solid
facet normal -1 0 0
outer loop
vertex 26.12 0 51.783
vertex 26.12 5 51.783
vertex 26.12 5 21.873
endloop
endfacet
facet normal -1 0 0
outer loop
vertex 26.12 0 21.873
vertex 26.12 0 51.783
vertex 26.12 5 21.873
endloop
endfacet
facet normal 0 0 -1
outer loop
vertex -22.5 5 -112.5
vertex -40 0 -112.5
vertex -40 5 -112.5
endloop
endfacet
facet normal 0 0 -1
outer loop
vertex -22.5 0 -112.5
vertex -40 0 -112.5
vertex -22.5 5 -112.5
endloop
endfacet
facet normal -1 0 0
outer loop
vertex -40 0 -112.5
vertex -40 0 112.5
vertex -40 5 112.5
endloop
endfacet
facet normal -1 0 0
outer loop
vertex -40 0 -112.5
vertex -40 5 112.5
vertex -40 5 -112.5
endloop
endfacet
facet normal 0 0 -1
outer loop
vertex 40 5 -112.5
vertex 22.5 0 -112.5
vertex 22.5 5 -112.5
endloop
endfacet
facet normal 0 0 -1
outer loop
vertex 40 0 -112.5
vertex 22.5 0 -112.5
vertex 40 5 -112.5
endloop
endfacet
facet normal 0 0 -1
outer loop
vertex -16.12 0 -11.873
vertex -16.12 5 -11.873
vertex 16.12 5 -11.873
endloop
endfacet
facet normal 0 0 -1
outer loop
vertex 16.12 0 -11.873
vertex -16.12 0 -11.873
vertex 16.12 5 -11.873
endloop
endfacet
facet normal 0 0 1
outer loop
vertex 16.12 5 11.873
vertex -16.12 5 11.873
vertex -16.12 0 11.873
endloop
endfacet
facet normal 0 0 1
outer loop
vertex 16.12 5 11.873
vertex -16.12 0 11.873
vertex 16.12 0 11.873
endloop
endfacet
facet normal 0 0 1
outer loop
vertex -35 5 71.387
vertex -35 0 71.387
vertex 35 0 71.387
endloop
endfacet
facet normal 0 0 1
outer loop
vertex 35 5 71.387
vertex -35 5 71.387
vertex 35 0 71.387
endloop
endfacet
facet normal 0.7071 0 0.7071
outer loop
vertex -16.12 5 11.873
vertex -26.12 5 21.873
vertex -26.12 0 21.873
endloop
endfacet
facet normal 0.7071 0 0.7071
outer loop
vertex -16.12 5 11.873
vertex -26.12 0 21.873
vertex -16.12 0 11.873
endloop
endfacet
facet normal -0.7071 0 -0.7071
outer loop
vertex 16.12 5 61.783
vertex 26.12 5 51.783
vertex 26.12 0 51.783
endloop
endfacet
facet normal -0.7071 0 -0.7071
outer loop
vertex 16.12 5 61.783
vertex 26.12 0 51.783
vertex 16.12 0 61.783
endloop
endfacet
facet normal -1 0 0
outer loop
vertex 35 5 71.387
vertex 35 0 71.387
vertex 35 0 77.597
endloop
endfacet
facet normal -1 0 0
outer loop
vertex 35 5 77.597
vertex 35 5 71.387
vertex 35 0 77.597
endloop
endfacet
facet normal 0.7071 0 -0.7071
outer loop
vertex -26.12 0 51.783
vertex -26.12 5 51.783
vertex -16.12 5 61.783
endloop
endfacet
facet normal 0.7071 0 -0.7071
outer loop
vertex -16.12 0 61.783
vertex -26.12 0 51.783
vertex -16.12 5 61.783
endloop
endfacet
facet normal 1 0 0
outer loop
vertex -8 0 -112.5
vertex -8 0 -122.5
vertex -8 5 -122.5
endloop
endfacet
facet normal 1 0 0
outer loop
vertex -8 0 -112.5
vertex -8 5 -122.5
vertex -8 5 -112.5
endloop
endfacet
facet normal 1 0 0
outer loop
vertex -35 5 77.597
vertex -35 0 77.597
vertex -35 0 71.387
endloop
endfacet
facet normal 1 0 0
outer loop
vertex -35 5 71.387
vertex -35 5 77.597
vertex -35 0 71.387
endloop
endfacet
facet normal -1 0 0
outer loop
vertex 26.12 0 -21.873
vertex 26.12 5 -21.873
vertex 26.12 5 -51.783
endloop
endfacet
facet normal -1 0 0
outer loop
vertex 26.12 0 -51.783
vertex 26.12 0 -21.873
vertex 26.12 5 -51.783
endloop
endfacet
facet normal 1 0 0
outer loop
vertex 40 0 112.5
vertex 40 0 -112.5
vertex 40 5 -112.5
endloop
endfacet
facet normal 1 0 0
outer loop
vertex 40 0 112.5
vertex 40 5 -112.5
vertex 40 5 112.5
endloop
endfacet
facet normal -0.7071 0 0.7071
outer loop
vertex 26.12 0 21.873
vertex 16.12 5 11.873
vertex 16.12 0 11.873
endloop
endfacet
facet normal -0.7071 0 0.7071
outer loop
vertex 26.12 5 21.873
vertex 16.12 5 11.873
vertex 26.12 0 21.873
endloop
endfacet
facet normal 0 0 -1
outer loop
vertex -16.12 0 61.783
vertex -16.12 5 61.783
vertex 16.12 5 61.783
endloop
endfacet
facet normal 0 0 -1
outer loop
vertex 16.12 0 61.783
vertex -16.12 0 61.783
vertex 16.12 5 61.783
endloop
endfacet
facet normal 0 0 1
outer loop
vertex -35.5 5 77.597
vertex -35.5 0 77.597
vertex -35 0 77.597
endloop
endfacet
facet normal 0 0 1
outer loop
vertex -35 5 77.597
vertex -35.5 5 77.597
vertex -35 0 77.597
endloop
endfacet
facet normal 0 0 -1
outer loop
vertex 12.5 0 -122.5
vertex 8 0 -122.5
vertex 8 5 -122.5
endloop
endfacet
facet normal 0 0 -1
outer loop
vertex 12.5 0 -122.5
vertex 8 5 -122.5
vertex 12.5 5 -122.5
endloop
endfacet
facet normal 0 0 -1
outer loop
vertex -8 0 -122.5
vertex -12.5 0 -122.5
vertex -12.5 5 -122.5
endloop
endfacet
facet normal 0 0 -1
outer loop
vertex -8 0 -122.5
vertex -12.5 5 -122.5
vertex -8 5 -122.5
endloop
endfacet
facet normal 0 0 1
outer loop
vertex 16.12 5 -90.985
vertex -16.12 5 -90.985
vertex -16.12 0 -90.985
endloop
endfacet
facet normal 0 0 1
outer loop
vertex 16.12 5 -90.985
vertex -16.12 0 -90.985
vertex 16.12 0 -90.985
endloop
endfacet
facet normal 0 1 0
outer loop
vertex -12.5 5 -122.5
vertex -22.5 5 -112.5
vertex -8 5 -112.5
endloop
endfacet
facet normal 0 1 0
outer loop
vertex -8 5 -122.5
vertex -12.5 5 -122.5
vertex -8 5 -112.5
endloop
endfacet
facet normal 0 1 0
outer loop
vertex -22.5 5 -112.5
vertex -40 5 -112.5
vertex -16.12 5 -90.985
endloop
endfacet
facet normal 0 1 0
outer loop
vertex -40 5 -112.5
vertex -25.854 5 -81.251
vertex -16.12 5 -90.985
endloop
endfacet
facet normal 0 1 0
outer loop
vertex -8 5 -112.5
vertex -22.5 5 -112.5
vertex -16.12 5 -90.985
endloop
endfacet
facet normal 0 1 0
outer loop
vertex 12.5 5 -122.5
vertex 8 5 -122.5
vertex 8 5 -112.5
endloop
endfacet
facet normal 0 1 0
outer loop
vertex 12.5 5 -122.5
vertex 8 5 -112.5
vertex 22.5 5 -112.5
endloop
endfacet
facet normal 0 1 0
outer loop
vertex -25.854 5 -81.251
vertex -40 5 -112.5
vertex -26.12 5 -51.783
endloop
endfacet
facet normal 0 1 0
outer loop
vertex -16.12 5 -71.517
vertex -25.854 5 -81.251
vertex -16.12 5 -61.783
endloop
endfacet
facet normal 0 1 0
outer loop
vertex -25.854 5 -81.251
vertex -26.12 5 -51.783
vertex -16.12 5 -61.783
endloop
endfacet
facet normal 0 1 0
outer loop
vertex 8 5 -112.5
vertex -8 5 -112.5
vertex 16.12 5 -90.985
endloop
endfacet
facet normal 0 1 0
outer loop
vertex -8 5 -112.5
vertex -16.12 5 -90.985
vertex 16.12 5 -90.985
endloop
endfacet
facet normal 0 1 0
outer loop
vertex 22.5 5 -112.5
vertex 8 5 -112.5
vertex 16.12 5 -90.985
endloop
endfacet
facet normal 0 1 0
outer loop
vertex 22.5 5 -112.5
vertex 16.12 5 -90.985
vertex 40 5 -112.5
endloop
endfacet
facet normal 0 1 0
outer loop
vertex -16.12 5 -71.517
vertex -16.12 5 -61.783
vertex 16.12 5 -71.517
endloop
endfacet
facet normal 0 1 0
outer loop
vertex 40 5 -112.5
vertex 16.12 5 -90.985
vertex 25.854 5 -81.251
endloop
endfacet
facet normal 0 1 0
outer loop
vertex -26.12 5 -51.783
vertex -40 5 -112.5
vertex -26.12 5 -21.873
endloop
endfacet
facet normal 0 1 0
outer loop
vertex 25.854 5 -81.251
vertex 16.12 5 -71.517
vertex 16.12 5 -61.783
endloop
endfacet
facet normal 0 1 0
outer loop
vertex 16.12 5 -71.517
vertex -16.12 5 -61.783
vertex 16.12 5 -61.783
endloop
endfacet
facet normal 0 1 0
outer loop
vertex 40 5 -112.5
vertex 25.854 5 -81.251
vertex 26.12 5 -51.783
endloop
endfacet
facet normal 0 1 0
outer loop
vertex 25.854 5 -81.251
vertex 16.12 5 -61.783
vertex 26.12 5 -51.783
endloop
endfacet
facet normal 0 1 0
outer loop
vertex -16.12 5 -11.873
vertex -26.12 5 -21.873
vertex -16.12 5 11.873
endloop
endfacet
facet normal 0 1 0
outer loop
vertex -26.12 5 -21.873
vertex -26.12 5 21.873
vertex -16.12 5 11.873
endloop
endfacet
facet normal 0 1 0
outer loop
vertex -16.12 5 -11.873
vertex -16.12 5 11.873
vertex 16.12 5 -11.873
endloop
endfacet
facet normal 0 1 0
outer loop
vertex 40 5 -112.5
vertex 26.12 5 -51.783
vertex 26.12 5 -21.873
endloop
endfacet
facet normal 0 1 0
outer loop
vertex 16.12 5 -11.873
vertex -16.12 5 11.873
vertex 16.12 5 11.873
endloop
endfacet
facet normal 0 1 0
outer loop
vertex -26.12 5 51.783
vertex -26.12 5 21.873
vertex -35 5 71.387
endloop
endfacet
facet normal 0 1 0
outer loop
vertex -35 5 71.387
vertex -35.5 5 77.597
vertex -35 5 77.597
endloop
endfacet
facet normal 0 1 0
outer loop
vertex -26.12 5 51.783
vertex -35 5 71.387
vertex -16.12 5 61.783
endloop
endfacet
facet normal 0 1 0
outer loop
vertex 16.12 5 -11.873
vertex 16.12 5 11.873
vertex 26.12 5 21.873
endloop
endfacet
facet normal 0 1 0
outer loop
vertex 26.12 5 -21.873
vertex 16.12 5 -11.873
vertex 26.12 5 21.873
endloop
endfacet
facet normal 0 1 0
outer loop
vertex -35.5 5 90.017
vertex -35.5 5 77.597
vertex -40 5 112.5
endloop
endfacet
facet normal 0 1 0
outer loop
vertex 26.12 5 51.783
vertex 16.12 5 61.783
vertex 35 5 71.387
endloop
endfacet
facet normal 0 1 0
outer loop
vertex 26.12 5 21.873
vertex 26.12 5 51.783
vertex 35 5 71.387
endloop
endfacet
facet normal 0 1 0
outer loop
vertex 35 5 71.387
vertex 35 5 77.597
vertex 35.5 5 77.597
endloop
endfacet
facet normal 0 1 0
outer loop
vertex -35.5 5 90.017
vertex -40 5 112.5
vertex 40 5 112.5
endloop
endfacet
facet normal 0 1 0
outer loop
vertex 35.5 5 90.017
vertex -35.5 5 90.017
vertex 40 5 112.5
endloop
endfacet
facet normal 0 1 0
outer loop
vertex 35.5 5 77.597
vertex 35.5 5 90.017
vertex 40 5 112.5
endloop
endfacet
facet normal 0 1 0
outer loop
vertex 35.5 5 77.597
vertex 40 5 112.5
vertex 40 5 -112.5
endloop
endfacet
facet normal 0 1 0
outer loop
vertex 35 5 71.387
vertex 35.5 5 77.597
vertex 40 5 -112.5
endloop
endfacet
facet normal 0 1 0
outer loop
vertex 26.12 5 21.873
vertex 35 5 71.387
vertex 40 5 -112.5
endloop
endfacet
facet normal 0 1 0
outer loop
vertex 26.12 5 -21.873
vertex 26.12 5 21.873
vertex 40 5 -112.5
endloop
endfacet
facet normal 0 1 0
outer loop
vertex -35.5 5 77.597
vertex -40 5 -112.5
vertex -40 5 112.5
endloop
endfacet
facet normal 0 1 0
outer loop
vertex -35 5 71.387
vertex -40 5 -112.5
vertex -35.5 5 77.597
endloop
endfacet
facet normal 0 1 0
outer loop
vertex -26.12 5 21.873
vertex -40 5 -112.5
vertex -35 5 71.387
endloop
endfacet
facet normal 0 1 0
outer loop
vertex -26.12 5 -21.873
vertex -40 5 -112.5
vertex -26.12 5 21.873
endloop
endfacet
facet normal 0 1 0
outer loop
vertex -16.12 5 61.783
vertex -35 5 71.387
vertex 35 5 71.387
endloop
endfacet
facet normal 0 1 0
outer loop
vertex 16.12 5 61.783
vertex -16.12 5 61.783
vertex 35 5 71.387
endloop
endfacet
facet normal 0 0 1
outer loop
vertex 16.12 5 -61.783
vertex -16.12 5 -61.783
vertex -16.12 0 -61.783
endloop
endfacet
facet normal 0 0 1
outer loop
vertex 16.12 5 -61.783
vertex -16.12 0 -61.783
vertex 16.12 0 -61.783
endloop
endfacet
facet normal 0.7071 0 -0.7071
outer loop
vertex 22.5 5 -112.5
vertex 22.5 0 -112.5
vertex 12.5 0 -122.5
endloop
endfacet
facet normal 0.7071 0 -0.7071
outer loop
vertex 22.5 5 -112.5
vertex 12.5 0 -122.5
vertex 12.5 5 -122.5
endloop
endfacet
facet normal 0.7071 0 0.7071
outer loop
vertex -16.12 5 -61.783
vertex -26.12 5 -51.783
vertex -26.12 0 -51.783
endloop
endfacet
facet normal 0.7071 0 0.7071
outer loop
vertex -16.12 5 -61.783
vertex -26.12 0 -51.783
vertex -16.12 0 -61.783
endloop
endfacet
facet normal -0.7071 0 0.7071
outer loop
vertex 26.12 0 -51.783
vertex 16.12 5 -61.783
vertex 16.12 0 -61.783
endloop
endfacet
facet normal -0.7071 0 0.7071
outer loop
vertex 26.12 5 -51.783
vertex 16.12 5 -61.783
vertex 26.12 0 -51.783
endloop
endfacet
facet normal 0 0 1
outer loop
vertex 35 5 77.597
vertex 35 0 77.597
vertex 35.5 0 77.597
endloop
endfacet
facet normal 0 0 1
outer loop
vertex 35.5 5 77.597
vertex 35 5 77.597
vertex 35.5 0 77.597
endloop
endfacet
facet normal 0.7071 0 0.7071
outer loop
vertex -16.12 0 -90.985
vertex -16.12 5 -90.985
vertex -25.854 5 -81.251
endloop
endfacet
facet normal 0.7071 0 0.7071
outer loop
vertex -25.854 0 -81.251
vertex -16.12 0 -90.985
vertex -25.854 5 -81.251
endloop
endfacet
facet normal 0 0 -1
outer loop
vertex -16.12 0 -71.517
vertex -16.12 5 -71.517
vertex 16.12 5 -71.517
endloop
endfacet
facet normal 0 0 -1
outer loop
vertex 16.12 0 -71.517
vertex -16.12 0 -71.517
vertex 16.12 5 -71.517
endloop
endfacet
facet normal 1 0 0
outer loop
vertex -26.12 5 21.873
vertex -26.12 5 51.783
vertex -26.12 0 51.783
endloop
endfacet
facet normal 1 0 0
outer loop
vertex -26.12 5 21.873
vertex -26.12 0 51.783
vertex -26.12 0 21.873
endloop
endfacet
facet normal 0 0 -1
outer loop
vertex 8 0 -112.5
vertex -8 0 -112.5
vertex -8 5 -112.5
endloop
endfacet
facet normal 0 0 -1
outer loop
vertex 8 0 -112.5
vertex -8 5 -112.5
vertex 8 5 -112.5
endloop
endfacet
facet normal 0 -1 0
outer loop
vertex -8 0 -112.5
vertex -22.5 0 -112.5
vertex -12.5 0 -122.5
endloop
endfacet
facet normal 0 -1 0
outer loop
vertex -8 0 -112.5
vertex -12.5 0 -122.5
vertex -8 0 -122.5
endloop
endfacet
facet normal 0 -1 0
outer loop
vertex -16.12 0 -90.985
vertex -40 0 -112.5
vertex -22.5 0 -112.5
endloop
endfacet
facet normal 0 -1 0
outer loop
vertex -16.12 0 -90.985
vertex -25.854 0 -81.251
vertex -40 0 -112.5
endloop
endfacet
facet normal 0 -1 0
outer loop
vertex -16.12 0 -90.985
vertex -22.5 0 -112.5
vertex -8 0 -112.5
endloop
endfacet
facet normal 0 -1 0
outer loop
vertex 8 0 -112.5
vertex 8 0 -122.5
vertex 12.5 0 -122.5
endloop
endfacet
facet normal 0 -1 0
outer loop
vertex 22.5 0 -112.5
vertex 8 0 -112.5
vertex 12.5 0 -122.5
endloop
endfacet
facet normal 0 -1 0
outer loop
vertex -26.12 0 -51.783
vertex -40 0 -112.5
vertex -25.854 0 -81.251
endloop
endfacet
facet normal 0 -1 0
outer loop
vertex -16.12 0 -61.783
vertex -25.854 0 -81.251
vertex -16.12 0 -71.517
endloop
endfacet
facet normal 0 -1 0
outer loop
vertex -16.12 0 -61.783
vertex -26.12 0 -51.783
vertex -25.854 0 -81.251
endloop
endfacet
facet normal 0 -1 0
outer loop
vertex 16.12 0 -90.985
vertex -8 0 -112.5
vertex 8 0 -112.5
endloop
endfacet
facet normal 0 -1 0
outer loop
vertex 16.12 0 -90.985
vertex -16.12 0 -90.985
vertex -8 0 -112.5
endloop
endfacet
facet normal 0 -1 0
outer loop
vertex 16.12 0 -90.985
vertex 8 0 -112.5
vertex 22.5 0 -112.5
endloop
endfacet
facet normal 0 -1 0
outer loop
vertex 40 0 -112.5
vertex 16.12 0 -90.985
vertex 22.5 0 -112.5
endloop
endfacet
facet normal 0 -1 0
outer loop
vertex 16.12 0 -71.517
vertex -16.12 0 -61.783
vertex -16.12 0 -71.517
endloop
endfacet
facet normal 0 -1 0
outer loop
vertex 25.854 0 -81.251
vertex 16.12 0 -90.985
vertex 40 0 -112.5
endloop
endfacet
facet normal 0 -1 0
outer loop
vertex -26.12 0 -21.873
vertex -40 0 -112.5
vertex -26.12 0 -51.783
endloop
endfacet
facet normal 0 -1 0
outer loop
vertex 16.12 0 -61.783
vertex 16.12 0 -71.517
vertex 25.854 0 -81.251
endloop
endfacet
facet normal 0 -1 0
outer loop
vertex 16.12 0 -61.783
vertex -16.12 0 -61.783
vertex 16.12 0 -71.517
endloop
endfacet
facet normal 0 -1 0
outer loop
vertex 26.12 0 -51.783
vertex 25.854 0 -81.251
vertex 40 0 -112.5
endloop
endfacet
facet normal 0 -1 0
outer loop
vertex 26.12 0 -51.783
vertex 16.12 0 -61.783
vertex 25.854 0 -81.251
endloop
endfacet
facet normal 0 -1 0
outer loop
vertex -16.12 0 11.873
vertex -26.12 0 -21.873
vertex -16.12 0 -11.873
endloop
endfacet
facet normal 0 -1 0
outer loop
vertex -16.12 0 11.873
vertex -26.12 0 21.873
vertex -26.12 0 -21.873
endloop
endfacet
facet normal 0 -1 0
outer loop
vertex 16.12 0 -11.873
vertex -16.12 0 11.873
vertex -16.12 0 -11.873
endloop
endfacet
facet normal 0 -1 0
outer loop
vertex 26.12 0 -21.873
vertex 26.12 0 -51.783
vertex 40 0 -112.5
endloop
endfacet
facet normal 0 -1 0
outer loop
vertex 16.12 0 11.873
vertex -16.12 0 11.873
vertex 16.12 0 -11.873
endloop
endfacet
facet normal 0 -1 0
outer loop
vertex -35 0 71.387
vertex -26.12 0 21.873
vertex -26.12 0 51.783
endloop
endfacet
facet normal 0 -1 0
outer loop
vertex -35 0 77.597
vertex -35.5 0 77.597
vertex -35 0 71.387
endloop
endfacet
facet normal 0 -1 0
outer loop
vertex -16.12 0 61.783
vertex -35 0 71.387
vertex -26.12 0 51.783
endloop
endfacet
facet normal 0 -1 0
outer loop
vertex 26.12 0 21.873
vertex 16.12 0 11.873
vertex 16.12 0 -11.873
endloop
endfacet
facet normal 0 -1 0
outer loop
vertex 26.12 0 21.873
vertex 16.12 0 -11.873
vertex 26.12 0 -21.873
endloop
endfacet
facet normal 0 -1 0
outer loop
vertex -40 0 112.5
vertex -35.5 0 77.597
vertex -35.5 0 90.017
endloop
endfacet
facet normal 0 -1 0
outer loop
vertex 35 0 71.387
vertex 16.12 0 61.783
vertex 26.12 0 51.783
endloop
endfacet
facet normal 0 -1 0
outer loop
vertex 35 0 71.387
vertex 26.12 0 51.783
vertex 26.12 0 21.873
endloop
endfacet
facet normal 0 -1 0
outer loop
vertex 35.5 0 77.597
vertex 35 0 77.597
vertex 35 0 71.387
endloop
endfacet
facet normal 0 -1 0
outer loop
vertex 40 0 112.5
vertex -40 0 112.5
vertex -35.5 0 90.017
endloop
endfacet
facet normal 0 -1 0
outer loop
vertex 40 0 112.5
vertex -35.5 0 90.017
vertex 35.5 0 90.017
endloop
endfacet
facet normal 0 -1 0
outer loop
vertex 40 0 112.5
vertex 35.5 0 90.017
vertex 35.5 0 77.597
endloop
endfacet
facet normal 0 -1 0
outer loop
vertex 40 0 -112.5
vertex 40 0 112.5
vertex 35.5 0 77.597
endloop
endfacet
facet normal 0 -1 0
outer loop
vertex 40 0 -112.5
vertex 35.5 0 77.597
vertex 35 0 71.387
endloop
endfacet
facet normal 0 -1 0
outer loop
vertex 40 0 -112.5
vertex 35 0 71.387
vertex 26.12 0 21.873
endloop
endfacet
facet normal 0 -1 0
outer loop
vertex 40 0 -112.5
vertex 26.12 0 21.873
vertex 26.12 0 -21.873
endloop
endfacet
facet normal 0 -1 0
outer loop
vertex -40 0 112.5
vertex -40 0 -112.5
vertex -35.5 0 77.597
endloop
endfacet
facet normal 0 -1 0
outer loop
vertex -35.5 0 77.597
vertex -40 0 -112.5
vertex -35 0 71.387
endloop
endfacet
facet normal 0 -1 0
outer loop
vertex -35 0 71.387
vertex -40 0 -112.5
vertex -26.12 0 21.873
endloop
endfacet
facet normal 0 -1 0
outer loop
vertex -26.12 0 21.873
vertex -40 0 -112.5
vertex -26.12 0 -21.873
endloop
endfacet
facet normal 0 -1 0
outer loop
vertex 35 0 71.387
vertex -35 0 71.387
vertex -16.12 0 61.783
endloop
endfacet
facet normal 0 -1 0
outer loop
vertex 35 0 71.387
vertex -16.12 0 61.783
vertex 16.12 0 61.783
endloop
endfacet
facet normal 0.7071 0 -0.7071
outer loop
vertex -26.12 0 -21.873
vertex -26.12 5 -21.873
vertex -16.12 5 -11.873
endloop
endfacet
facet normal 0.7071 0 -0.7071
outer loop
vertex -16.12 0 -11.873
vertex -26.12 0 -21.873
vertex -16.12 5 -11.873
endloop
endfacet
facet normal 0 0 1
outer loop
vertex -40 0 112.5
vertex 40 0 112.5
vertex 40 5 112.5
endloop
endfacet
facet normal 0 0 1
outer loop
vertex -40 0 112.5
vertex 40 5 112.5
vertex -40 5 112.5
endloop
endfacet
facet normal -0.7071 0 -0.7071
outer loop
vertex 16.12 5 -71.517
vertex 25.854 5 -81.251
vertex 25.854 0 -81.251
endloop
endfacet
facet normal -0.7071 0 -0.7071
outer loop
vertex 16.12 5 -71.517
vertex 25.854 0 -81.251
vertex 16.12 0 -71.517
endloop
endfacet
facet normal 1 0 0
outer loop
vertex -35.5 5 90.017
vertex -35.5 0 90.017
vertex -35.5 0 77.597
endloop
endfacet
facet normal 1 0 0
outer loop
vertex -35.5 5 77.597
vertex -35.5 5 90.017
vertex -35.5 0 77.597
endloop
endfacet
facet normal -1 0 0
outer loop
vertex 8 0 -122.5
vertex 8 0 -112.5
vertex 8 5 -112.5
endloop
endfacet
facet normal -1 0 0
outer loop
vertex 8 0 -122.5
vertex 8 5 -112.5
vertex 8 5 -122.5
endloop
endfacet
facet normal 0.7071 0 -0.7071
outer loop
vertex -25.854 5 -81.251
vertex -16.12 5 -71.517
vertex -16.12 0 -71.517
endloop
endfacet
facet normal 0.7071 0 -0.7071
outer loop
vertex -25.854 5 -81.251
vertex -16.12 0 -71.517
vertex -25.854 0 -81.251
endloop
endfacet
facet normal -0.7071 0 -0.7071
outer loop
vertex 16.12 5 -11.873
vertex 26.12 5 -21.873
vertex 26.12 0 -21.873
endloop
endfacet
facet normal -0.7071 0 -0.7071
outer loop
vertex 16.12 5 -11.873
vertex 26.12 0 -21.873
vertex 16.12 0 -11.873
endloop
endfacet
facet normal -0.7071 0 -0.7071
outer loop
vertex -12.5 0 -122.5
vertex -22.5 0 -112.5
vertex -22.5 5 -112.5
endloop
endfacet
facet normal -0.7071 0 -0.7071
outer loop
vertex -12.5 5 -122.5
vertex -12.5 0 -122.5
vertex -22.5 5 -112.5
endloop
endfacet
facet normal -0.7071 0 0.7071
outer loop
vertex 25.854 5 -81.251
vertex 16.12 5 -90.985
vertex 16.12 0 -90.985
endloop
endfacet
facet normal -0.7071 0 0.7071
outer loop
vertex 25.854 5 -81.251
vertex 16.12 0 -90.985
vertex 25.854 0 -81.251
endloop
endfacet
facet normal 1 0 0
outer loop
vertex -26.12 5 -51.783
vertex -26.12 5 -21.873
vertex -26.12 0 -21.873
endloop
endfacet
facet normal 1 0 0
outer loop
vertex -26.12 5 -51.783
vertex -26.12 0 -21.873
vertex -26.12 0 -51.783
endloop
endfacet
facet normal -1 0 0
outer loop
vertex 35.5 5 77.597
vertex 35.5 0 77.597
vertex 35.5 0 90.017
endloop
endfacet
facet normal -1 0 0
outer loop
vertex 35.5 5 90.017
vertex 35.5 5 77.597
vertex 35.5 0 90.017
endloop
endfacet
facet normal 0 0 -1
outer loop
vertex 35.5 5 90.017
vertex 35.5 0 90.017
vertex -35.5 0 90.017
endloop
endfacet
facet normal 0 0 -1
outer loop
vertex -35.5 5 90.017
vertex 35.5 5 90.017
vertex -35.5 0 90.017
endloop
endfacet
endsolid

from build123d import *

# Parameters (mm, degrees)
BOSS_EXTRUDE1_DEPTH = 5
CHAMFER1_SIZE       = 10
SKETCH2_W           = 52.240142394
SKETCH2_H           = 49.910170897
SKETCH2_H_2         = 19.468376047
CUT_EXTRUDE1_DEPTH  = 5
CHAMFER2_SIZE       = 10


# Some blends are built 0.0001 mm under size
with BuildPart() as part:
    # Sketch1 → Boss-Extrude1 (new body)
    with BuildSketch(Plane(origin=(0, 0, 0), x_dir=(1, 0, 0), z_dir=(0, 1, 0))):
        Polygon((12.5, 112.5), (40, 112.5), (40, -112.5), (-40, -112.5), (-40, 112.5), (-12.5, 112.5), (-12.5, 122.5), (-8, 122.5), (-8, 112.5), (8, 112.5), (8, 122.5), (12.5, 122.5), align=None)
        Polygon((35, -71.386750493), (35, -77.596695784), (35.5, -77.596695784), (35.5, -90.016586366), (-35.5, -90.016586366), (-35.5, -77.596695784), (-35, -77.596695784), (-35, -71.386750493), align=None, mode=Mode.SUBTRACT)
    extrude(amount=BOSS_EXTRUDE1_DEPTH)

    # Chamfer1
    chamfer1_edges = [part.edges().sort_by_distance(p)[0] for p in [
        (-12.5, 2.5, -112.5),
        (12.5, 2.5, -112.5),
    ]]
    chamfer(chamfer1_edges, length=CHAMFER1_SIZE - 0.0001)  # a hair under: the kernel refuses the full size

    # Sketch2 → Cut-Extrude1 (cut)
    with BuildSketch(Plane(origin=(0, 5, 0), x_dir=(1, 0, 0), z_dir=(0, 1, 0))):
        with Locations((0, 36.827678023)):
            Rectangle(SKETCH2_W, SKETCH2_H)
        with Locations((0, -36.827678023)):
            Rectangle(SKETCH2_W, SKETCH2_H)
        with Locations((0, 81.251139518)):
            Rectangle(SKETCH2_W, SKETCH2_H_2)
    extrude(amount=-CUT_EXTRUDE1_DEPTH, mode=Mode.SUBTRACT)

    # Chamfer2
    # the kernel refuses this chamfer: 10 mm, written as the material it adds along each edge
    with BuildSketch(Plane(origin=(26.120071197, 5, -90.985327541), x_dir=(-0.9996219169112968, 0, -0.027495876610586317), z_dir=(0, -1, 0)), Plane(origin=(26.120071197, 5, -71.516951494), x_dir=(0.027495876610586317, 0, -0.9996219169112968), z_dir=(0, -1, 0)), Plane(origin=(-26.120071197, 5, -71.516951494), x_dir=(0.9996219169112968, 0, 0.027495876610586317), z_dir=(0, -1, 0)), Plane(origin=(-26.120071197, 5, 11.872592574), x_dir=(-0.027495876610586667, 0, 0.9996219169112968), z_dir=(0, -1, 0)), Plane(origin=(26.120071197, 5, 11.872592574), x_dir=(-0.9996219169112968, 0, -0.027495876610586317), z_dir=(0, -1, 0)), Plane(origin=(26.120071197, 5, 61.782763471), x_dir=(0.027495876610586317, 0, -0.9996219169112968), z_dir=(0, -1, 0)), Plane(origin=(26.120071197, 5, -61.782763471), x_dir=(-0.9996219169112968, 0, -0.027495876610586317), z_dir=(0, -1, 0)), Plane(origin=(26.120071197, 5, -11.872592574), x_dir=(0.027495876610586324, 0, -0.9996219169112968), z_dir=(0, -1, 0)), Plane(origin=(-26.120071197, 5, -61.782763471), x_dir=(-0.027495876610585973, 0, 0.9996219169112968), z_dir=(0, -1, 0))) as chamfer2_piece_1:
        Polygon((CHAMFER2_SIZE * 0.999621916911, -CHAMFER2_SIZE * 0.0274958766106), (-CHAMFER2_SIZE * 0.0274958766106, -CHAMFER2_SIZE * 0.999621916911), (0, 0), align=None)
    extrude(amount=5)
    with BuildSketch(Plane(origin=(-26.120071197, 5, -90.985327541), x_dir=(0.9996219169112968, 0, -0.027495876610586317), z_dir=(0, -1, 0)), Plane(origin=(-26.120071197, 5, 61.782763471), x_dir=(-0.027495876610585973, 0, -0.9996219169112968), z_dir=(0, -1, 0)), Plane(origin=(-26.120071197, 5, -11.872592574), x_dir=(-0.027495876610586667, 0, -0.9996219169112968), z_dir=(0, -1, 0))) as chamfer2_piece_2:
        Polygon((CHAMFER2_SIZE * 0.999621916911, CHAMFER2_SIZE * 0.0274958766106), (-CHAMFER2_SIZE * 0.0274958766106, CHAMFER2_SIZE * 0.999621916911), (0, 0), align=None)
    extrude(amount=5)


solid = part.part
